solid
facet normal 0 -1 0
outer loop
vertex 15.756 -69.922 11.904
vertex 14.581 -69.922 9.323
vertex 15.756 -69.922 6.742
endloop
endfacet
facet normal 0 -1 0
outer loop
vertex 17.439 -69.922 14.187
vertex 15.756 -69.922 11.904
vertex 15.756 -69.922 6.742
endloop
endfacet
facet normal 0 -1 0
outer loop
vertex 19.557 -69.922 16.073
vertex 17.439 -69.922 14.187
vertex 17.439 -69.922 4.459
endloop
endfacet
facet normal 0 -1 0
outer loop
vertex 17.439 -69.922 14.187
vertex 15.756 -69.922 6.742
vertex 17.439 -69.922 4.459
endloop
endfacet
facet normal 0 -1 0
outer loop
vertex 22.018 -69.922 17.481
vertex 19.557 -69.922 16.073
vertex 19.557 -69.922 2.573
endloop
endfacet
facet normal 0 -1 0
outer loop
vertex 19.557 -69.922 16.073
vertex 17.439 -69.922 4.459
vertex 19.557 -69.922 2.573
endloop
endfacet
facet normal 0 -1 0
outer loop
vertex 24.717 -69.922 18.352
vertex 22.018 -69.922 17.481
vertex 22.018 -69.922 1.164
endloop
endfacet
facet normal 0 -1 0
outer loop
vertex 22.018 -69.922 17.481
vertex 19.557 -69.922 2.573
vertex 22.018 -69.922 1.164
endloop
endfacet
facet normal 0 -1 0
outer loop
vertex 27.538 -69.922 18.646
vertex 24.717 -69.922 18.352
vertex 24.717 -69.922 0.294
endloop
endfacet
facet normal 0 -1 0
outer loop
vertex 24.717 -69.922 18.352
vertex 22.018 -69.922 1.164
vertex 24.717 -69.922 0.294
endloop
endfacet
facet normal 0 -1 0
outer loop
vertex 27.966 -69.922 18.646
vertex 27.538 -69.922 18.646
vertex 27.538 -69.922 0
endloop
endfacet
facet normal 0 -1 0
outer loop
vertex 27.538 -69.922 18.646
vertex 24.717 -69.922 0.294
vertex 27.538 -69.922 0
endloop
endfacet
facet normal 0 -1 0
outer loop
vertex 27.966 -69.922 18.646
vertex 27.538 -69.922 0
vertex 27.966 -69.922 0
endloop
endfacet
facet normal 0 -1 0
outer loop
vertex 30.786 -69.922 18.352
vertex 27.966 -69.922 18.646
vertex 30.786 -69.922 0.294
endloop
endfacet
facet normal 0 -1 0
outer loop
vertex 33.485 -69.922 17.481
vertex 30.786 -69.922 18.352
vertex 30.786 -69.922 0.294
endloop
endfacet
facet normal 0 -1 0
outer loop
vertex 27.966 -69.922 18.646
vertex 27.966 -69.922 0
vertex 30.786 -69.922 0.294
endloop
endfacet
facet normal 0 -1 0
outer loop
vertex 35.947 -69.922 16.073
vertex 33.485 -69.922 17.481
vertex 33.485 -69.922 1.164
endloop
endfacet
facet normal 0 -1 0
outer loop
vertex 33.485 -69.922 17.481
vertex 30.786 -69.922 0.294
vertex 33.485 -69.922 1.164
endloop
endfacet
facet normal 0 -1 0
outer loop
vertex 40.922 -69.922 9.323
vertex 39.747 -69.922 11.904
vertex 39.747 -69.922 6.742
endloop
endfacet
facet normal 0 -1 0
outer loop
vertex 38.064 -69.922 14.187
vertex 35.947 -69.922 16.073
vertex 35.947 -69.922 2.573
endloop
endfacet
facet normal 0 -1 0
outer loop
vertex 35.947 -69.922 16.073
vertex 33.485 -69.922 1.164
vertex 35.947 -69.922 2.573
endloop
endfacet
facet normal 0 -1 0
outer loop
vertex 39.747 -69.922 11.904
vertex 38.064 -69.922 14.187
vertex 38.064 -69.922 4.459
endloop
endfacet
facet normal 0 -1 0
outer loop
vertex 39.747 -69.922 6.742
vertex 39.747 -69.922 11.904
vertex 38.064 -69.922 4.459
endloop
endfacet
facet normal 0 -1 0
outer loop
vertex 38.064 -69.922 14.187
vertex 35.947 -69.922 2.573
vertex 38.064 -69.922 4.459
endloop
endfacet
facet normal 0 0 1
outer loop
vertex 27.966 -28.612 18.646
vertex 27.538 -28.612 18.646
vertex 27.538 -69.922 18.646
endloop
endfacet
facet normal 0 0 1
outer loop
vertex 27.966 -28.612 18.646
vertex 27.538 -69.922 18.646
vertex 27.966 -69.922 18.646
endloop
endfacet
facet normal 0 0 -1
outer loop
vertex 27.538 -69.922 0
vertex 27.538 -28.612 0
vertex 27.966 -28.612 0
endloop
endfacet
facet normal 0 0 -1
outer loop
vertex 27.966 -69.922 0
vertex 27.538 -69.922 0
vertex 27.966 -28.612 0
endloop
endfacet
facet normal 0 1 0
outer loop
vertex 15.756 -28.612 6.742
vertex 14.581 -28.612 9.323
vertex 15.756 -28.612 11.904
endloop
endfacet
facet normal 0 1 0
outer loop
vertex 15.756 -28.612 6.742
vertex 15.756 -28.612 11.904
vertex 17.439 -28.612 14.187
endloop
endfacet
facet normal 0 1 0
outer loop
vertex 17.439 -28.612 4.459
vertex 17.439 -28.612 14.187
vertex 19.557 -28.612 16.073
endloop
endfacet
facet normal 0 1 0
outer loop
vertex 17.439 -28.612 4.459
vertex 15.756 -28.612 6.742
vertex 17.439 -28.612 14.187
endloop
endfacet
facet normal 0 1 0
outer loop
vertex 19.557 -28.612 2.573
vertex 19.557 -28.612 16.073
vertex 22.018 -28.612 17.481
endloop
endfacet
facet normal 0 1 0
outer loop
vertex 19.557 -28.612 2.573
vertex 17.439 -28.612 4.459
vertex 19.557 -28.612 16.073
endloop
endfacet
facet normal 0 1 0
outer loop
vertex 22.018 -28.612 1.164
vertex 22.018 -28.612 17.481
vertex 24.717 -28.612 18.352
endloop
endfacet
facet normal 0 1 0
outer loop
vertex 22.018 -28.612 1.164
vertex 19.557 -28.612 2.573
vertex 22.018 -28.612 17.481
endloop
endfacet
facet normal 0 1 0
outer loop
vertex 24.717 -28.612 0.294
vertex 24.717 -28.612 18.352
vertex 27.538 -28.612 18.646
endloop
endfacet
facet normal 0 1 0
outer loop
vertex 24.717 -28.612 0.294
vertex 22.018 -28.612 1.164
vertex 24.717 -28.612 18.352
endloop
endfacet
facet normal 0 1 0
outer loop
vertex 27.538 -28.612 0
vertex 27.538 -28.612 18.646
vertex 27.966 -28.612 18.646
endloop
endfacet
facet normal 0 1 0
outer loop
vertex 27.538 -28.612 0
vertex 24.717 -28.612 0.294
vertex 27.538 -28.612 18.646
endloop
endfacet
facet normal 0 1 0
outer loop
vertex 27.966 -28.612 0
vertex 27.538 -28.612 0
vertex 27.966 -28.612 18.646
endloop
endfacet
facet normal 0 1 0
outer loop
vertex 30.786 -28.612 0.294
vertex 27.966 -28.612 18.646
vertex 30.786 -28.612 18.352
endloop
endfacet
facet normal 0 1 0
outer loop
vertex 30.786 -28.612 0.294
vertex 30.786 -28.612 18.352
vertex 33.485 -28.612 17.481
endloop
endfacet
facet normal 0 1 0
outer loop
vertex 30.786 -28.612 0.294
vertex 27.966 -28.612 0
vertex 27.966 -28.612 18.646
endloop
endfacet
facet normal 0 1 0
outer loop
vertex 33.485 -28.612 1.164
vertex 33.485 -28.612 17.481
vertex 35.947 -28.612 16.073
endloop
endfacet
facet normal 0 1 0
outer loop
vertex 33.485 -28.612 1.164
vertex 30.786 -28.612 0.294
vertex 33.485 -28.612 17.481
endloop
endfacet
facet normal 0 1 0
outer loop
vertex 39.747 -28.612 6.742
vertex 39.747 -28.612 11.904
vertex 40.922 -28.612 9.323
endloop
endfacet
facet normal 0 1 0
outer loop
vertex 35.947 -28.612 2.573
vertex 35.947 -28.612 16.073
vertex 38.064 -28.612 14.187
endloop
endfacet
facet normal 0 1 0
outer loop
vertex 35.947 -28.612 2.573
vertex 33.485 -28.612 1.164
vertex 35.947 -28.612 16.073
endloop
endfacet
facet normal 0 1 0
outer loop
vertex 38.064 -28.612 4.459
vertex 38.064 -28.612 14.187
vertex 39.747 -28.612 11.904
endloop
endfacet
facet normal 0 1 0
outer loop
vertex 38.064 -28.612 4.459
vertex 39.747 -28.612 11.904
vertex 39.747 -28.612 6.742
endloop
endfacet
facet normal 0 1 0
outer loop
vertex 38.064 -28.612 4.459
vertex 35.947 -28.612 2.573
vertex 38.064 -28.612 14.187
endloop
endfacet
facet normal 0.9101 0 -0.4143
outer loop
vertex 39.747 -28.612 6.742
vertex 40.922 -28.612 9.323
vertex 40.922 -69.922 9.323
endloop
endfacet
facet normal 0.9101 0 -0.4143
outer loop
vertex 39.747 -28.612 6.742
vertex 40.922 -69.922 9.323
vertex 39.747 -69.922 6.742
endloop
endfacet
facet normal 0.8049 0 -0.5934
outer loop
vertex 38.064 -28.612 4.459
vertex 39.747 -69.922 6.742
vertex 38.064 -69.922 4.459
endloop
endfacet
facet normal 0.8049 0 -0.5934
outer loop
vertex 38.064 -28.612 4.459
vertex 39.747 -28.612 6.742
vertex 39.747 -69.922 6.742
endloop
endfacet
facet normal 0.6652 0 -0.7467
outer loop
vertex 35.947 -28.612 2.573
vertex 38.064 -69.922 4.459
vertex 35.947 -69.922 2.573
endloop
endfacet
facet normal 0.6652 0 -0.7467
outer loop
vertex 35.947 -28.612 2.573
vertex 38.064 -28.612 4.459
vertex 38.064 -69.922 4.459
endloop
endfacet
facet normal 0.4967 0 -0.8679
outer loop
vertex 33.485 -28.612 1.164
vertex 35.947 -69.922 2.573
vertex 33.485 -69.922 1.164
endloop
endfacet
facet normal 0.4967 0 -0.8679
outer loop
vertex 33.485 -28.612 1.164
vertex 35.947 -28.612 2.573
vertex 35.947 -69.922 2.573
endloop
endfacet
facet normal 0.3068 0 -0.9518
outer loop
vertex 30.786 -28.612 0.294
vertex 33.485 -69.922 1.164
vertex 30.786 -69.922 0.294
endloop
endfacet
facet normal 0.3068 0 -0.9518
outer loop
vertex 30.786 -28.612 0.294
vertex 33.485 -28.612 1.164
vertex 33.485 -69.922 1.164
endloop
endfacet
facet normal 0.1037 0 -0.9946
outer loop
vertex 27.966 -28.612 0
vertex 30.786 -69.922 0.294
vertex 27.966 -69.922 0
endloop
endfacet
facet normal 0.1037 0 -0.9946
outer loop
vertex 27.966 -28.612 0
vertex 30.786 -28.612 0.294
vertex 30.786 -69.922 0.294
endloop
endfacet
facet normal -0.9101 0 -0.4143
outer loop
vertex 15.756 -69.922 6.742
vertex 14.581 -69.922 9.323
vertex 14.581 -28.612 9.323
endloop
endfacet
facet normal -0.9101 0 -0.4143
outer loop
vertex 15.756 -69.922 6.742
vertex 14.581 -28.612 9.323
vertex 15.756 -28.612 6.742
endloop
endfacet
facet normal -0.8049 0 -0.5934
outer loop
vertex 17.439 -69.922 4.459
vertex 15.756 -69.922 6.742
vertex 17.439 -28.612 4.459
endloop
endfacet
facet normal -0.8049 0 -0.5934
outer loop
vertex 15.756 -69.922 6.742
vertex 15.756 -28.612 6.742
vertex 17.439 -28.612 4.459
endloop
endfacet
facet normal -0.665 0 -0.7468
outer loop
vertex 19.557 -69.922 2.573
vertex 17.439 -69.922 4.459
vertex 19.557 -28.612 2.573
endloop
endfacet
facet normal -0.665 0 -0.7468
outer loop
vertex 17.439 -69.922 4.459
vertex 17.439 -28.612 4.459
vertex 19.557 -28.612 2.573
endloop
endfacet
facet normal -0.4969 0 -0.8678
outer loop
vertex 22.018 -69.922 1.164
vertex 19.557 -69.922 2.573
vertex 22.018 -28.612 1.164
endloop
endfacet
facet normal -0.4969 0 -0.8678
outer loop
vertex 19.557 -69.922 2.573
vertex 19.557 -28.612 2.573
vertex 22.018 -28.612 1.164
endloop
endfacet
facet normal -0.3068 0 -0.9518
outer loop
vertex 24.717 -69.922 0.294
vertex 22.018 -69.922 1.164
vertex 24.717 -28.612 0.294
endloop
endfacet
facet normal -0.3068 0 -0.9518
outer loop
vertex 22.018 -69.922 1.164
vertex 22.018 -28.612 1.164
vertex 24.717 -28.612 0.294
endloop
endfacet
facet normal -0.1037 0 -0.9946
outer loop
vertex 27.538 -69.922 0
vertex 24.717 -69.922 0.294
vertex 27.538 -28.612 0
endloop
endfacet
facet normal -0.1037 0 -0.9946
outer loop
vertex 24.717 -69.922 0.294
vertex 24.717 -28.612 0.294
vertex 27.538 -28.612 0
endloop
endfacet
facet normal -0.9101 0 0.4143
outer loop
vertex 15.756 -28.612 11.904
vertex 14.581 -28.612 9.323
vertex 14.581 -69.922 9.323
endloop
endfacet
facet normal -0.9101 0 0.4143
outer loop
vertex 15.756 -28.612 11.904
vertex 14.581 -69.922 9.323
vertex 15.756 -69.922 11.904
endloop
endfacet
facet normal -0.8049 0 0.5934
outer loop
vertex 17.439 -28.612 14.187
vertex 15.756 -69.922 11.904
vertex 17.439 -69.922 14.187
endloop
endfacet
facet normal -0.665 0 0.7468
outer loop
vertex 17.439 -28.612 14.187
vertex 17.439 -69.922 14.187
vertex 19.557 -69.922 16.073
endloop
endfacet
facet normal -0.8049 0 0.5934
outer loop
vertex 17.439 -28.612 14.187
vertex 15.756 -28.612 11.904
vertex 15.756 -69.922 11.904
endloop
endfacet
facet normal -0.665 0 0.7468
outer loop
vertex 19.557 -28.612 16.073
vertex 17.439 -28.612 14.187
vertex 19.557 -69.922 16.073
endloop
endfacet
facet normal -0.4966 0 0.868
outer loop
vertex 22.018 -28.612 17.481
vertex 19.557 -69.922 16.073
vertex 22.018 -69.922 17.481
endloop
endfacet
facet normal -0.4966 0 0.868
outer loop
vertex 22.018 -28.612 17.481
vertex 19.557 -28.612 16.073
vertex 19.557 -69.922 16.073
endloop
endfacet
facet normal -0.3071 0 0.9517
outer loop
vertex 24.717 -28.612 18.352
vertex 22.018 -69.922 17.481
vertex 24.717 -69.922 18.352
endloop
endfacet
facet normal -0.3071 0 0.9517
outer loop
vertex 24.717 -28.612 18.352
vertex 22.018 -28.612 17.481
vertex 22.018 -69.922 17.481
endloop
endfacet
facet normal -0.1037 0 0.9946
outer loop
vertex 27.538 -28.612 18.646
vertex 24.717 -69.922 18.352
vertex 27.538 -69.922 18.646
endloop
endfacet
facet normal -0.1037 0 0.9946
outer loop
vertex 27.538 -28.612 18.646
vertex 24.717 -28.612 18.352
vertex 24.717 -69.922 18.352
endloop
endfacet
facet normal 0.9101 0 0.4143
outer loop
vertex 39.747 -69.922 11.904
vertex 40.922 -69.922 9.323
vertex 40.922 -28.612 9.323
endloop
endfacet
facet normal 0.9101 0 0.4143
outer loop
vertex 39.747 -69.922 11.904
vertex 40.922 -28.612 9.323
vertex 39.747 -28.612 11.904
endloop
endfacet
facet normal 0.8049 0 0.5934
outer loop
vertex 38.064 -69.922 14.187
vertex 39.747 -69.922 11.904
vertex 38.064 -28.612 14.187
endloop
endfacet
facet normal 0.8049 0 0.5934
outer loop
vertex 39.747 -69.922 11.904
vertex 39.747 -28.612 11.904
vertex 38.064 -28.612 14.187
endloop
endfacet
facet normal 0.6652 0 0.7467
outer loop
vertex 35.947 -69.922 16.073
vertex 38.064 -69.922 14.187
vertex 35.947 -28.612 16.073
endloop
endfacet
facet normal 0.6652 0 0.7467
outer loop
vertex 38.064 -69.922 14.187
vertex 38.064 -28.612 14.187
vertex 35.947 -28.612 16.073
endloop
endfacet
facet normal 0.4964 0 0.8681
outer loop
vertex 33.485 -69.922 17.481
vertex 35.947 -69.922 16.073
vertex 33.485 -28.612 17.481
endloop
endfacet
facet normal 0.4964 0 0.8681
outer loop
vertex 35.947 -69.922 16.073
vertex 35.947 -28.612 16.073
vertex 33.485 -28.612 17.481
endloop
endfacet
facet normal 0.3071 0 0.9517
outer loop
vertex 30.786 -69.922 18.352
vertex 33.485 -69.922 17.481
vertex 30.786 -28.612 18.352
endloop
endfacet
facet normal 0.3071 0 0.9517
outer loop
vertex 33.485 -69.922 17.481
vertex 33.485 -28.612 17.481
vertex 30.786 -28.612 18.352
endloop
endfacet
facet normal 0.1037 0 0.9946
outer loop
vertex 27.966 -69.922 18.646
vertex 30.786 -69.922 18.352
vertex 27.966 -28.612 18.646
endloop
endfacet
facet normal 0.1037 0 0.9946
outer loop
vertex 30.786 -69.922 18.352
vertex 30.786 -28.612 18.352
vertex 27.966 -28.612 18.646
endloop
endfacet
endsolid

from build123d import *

# Parameters (mm, degrees)
F0_W        = 27.7576074004
F0_H        = 41.3104146719
F1_DEPTH    = 18.6459105462
F2_T1_DEPTH = 109.6348425509


# Not quite as in the source:
# - a fillet or chamfer that OpenCascade refuses, or shapes differently, is made with other operations: its cross-section is extruded or revolved along the edge and cut away or added


with BuildPart() as f1:
    # F0 (on Top) → F1 (new body)
    with BuildSketch(Plane.XY):
        with Locations((27.7516692877, -49.2671057582)):
            Rectangle(F0_W, F0_H)
    extrude(amount=F1_DEPTH)

    # F2: fillet of radius 13.6648855758 on 4 edges, made by hand

    # F2_s2 → F2_t1 (cut)
    with BuildSketch(Plane.XZ.offset(-5.5503155173)):
        with BuildLine():
            ThreePointArc((41.6304729879, 4.9810249704), (37.6281206669, 14.6435582252), (27.9655874121, 18.6459105462))
            Line((27.9655874121, 18.6459105462), (41.6304729879, 18.6459105462))
            Line((41.6304729879, 18.6459105462), (41.6304729879, 4.9810249704))
        make_face()
        with BuildLine():
            ThreePointArc((13.8728655875, 4.9810249704), (17.8752179085, 14.6435582252), (27.5377511633, 18.6459105462))
            Line((27.5377511633, 18.6459105462), (13.8728655875, 18.6459105462))
            Line((13.8728655875, 18.6459105462), (13.8728655875, 4.9810249704))
        make_face()
        with BuildLine():
            ThreePointArc((41.6304729879, 13.6648855758), (37.6281206669, 4.002352321), (27.9655874121, 0))
            Line((27.9655874121, 0), (41.6304729879, 0))
            Line((41.6304729879, 0), (41.6304729879, 13.6648855758))
        make_face()
        with BuildLine():
            ThreePointArc((13.8728655875, 13.6648855758), (17.8752179085, 4.002352321), (27.5377511633, 0))
            Line((27.5377511633, 0), (13.8728655875, 0))
            Line((13.8728655875, 0), (13.8728655875, 13.6648855758))
        make_face()
    extrude(amount=F2_T1_DEPTH, mode=Mode.SUBTRACT)


solid = f1.part
